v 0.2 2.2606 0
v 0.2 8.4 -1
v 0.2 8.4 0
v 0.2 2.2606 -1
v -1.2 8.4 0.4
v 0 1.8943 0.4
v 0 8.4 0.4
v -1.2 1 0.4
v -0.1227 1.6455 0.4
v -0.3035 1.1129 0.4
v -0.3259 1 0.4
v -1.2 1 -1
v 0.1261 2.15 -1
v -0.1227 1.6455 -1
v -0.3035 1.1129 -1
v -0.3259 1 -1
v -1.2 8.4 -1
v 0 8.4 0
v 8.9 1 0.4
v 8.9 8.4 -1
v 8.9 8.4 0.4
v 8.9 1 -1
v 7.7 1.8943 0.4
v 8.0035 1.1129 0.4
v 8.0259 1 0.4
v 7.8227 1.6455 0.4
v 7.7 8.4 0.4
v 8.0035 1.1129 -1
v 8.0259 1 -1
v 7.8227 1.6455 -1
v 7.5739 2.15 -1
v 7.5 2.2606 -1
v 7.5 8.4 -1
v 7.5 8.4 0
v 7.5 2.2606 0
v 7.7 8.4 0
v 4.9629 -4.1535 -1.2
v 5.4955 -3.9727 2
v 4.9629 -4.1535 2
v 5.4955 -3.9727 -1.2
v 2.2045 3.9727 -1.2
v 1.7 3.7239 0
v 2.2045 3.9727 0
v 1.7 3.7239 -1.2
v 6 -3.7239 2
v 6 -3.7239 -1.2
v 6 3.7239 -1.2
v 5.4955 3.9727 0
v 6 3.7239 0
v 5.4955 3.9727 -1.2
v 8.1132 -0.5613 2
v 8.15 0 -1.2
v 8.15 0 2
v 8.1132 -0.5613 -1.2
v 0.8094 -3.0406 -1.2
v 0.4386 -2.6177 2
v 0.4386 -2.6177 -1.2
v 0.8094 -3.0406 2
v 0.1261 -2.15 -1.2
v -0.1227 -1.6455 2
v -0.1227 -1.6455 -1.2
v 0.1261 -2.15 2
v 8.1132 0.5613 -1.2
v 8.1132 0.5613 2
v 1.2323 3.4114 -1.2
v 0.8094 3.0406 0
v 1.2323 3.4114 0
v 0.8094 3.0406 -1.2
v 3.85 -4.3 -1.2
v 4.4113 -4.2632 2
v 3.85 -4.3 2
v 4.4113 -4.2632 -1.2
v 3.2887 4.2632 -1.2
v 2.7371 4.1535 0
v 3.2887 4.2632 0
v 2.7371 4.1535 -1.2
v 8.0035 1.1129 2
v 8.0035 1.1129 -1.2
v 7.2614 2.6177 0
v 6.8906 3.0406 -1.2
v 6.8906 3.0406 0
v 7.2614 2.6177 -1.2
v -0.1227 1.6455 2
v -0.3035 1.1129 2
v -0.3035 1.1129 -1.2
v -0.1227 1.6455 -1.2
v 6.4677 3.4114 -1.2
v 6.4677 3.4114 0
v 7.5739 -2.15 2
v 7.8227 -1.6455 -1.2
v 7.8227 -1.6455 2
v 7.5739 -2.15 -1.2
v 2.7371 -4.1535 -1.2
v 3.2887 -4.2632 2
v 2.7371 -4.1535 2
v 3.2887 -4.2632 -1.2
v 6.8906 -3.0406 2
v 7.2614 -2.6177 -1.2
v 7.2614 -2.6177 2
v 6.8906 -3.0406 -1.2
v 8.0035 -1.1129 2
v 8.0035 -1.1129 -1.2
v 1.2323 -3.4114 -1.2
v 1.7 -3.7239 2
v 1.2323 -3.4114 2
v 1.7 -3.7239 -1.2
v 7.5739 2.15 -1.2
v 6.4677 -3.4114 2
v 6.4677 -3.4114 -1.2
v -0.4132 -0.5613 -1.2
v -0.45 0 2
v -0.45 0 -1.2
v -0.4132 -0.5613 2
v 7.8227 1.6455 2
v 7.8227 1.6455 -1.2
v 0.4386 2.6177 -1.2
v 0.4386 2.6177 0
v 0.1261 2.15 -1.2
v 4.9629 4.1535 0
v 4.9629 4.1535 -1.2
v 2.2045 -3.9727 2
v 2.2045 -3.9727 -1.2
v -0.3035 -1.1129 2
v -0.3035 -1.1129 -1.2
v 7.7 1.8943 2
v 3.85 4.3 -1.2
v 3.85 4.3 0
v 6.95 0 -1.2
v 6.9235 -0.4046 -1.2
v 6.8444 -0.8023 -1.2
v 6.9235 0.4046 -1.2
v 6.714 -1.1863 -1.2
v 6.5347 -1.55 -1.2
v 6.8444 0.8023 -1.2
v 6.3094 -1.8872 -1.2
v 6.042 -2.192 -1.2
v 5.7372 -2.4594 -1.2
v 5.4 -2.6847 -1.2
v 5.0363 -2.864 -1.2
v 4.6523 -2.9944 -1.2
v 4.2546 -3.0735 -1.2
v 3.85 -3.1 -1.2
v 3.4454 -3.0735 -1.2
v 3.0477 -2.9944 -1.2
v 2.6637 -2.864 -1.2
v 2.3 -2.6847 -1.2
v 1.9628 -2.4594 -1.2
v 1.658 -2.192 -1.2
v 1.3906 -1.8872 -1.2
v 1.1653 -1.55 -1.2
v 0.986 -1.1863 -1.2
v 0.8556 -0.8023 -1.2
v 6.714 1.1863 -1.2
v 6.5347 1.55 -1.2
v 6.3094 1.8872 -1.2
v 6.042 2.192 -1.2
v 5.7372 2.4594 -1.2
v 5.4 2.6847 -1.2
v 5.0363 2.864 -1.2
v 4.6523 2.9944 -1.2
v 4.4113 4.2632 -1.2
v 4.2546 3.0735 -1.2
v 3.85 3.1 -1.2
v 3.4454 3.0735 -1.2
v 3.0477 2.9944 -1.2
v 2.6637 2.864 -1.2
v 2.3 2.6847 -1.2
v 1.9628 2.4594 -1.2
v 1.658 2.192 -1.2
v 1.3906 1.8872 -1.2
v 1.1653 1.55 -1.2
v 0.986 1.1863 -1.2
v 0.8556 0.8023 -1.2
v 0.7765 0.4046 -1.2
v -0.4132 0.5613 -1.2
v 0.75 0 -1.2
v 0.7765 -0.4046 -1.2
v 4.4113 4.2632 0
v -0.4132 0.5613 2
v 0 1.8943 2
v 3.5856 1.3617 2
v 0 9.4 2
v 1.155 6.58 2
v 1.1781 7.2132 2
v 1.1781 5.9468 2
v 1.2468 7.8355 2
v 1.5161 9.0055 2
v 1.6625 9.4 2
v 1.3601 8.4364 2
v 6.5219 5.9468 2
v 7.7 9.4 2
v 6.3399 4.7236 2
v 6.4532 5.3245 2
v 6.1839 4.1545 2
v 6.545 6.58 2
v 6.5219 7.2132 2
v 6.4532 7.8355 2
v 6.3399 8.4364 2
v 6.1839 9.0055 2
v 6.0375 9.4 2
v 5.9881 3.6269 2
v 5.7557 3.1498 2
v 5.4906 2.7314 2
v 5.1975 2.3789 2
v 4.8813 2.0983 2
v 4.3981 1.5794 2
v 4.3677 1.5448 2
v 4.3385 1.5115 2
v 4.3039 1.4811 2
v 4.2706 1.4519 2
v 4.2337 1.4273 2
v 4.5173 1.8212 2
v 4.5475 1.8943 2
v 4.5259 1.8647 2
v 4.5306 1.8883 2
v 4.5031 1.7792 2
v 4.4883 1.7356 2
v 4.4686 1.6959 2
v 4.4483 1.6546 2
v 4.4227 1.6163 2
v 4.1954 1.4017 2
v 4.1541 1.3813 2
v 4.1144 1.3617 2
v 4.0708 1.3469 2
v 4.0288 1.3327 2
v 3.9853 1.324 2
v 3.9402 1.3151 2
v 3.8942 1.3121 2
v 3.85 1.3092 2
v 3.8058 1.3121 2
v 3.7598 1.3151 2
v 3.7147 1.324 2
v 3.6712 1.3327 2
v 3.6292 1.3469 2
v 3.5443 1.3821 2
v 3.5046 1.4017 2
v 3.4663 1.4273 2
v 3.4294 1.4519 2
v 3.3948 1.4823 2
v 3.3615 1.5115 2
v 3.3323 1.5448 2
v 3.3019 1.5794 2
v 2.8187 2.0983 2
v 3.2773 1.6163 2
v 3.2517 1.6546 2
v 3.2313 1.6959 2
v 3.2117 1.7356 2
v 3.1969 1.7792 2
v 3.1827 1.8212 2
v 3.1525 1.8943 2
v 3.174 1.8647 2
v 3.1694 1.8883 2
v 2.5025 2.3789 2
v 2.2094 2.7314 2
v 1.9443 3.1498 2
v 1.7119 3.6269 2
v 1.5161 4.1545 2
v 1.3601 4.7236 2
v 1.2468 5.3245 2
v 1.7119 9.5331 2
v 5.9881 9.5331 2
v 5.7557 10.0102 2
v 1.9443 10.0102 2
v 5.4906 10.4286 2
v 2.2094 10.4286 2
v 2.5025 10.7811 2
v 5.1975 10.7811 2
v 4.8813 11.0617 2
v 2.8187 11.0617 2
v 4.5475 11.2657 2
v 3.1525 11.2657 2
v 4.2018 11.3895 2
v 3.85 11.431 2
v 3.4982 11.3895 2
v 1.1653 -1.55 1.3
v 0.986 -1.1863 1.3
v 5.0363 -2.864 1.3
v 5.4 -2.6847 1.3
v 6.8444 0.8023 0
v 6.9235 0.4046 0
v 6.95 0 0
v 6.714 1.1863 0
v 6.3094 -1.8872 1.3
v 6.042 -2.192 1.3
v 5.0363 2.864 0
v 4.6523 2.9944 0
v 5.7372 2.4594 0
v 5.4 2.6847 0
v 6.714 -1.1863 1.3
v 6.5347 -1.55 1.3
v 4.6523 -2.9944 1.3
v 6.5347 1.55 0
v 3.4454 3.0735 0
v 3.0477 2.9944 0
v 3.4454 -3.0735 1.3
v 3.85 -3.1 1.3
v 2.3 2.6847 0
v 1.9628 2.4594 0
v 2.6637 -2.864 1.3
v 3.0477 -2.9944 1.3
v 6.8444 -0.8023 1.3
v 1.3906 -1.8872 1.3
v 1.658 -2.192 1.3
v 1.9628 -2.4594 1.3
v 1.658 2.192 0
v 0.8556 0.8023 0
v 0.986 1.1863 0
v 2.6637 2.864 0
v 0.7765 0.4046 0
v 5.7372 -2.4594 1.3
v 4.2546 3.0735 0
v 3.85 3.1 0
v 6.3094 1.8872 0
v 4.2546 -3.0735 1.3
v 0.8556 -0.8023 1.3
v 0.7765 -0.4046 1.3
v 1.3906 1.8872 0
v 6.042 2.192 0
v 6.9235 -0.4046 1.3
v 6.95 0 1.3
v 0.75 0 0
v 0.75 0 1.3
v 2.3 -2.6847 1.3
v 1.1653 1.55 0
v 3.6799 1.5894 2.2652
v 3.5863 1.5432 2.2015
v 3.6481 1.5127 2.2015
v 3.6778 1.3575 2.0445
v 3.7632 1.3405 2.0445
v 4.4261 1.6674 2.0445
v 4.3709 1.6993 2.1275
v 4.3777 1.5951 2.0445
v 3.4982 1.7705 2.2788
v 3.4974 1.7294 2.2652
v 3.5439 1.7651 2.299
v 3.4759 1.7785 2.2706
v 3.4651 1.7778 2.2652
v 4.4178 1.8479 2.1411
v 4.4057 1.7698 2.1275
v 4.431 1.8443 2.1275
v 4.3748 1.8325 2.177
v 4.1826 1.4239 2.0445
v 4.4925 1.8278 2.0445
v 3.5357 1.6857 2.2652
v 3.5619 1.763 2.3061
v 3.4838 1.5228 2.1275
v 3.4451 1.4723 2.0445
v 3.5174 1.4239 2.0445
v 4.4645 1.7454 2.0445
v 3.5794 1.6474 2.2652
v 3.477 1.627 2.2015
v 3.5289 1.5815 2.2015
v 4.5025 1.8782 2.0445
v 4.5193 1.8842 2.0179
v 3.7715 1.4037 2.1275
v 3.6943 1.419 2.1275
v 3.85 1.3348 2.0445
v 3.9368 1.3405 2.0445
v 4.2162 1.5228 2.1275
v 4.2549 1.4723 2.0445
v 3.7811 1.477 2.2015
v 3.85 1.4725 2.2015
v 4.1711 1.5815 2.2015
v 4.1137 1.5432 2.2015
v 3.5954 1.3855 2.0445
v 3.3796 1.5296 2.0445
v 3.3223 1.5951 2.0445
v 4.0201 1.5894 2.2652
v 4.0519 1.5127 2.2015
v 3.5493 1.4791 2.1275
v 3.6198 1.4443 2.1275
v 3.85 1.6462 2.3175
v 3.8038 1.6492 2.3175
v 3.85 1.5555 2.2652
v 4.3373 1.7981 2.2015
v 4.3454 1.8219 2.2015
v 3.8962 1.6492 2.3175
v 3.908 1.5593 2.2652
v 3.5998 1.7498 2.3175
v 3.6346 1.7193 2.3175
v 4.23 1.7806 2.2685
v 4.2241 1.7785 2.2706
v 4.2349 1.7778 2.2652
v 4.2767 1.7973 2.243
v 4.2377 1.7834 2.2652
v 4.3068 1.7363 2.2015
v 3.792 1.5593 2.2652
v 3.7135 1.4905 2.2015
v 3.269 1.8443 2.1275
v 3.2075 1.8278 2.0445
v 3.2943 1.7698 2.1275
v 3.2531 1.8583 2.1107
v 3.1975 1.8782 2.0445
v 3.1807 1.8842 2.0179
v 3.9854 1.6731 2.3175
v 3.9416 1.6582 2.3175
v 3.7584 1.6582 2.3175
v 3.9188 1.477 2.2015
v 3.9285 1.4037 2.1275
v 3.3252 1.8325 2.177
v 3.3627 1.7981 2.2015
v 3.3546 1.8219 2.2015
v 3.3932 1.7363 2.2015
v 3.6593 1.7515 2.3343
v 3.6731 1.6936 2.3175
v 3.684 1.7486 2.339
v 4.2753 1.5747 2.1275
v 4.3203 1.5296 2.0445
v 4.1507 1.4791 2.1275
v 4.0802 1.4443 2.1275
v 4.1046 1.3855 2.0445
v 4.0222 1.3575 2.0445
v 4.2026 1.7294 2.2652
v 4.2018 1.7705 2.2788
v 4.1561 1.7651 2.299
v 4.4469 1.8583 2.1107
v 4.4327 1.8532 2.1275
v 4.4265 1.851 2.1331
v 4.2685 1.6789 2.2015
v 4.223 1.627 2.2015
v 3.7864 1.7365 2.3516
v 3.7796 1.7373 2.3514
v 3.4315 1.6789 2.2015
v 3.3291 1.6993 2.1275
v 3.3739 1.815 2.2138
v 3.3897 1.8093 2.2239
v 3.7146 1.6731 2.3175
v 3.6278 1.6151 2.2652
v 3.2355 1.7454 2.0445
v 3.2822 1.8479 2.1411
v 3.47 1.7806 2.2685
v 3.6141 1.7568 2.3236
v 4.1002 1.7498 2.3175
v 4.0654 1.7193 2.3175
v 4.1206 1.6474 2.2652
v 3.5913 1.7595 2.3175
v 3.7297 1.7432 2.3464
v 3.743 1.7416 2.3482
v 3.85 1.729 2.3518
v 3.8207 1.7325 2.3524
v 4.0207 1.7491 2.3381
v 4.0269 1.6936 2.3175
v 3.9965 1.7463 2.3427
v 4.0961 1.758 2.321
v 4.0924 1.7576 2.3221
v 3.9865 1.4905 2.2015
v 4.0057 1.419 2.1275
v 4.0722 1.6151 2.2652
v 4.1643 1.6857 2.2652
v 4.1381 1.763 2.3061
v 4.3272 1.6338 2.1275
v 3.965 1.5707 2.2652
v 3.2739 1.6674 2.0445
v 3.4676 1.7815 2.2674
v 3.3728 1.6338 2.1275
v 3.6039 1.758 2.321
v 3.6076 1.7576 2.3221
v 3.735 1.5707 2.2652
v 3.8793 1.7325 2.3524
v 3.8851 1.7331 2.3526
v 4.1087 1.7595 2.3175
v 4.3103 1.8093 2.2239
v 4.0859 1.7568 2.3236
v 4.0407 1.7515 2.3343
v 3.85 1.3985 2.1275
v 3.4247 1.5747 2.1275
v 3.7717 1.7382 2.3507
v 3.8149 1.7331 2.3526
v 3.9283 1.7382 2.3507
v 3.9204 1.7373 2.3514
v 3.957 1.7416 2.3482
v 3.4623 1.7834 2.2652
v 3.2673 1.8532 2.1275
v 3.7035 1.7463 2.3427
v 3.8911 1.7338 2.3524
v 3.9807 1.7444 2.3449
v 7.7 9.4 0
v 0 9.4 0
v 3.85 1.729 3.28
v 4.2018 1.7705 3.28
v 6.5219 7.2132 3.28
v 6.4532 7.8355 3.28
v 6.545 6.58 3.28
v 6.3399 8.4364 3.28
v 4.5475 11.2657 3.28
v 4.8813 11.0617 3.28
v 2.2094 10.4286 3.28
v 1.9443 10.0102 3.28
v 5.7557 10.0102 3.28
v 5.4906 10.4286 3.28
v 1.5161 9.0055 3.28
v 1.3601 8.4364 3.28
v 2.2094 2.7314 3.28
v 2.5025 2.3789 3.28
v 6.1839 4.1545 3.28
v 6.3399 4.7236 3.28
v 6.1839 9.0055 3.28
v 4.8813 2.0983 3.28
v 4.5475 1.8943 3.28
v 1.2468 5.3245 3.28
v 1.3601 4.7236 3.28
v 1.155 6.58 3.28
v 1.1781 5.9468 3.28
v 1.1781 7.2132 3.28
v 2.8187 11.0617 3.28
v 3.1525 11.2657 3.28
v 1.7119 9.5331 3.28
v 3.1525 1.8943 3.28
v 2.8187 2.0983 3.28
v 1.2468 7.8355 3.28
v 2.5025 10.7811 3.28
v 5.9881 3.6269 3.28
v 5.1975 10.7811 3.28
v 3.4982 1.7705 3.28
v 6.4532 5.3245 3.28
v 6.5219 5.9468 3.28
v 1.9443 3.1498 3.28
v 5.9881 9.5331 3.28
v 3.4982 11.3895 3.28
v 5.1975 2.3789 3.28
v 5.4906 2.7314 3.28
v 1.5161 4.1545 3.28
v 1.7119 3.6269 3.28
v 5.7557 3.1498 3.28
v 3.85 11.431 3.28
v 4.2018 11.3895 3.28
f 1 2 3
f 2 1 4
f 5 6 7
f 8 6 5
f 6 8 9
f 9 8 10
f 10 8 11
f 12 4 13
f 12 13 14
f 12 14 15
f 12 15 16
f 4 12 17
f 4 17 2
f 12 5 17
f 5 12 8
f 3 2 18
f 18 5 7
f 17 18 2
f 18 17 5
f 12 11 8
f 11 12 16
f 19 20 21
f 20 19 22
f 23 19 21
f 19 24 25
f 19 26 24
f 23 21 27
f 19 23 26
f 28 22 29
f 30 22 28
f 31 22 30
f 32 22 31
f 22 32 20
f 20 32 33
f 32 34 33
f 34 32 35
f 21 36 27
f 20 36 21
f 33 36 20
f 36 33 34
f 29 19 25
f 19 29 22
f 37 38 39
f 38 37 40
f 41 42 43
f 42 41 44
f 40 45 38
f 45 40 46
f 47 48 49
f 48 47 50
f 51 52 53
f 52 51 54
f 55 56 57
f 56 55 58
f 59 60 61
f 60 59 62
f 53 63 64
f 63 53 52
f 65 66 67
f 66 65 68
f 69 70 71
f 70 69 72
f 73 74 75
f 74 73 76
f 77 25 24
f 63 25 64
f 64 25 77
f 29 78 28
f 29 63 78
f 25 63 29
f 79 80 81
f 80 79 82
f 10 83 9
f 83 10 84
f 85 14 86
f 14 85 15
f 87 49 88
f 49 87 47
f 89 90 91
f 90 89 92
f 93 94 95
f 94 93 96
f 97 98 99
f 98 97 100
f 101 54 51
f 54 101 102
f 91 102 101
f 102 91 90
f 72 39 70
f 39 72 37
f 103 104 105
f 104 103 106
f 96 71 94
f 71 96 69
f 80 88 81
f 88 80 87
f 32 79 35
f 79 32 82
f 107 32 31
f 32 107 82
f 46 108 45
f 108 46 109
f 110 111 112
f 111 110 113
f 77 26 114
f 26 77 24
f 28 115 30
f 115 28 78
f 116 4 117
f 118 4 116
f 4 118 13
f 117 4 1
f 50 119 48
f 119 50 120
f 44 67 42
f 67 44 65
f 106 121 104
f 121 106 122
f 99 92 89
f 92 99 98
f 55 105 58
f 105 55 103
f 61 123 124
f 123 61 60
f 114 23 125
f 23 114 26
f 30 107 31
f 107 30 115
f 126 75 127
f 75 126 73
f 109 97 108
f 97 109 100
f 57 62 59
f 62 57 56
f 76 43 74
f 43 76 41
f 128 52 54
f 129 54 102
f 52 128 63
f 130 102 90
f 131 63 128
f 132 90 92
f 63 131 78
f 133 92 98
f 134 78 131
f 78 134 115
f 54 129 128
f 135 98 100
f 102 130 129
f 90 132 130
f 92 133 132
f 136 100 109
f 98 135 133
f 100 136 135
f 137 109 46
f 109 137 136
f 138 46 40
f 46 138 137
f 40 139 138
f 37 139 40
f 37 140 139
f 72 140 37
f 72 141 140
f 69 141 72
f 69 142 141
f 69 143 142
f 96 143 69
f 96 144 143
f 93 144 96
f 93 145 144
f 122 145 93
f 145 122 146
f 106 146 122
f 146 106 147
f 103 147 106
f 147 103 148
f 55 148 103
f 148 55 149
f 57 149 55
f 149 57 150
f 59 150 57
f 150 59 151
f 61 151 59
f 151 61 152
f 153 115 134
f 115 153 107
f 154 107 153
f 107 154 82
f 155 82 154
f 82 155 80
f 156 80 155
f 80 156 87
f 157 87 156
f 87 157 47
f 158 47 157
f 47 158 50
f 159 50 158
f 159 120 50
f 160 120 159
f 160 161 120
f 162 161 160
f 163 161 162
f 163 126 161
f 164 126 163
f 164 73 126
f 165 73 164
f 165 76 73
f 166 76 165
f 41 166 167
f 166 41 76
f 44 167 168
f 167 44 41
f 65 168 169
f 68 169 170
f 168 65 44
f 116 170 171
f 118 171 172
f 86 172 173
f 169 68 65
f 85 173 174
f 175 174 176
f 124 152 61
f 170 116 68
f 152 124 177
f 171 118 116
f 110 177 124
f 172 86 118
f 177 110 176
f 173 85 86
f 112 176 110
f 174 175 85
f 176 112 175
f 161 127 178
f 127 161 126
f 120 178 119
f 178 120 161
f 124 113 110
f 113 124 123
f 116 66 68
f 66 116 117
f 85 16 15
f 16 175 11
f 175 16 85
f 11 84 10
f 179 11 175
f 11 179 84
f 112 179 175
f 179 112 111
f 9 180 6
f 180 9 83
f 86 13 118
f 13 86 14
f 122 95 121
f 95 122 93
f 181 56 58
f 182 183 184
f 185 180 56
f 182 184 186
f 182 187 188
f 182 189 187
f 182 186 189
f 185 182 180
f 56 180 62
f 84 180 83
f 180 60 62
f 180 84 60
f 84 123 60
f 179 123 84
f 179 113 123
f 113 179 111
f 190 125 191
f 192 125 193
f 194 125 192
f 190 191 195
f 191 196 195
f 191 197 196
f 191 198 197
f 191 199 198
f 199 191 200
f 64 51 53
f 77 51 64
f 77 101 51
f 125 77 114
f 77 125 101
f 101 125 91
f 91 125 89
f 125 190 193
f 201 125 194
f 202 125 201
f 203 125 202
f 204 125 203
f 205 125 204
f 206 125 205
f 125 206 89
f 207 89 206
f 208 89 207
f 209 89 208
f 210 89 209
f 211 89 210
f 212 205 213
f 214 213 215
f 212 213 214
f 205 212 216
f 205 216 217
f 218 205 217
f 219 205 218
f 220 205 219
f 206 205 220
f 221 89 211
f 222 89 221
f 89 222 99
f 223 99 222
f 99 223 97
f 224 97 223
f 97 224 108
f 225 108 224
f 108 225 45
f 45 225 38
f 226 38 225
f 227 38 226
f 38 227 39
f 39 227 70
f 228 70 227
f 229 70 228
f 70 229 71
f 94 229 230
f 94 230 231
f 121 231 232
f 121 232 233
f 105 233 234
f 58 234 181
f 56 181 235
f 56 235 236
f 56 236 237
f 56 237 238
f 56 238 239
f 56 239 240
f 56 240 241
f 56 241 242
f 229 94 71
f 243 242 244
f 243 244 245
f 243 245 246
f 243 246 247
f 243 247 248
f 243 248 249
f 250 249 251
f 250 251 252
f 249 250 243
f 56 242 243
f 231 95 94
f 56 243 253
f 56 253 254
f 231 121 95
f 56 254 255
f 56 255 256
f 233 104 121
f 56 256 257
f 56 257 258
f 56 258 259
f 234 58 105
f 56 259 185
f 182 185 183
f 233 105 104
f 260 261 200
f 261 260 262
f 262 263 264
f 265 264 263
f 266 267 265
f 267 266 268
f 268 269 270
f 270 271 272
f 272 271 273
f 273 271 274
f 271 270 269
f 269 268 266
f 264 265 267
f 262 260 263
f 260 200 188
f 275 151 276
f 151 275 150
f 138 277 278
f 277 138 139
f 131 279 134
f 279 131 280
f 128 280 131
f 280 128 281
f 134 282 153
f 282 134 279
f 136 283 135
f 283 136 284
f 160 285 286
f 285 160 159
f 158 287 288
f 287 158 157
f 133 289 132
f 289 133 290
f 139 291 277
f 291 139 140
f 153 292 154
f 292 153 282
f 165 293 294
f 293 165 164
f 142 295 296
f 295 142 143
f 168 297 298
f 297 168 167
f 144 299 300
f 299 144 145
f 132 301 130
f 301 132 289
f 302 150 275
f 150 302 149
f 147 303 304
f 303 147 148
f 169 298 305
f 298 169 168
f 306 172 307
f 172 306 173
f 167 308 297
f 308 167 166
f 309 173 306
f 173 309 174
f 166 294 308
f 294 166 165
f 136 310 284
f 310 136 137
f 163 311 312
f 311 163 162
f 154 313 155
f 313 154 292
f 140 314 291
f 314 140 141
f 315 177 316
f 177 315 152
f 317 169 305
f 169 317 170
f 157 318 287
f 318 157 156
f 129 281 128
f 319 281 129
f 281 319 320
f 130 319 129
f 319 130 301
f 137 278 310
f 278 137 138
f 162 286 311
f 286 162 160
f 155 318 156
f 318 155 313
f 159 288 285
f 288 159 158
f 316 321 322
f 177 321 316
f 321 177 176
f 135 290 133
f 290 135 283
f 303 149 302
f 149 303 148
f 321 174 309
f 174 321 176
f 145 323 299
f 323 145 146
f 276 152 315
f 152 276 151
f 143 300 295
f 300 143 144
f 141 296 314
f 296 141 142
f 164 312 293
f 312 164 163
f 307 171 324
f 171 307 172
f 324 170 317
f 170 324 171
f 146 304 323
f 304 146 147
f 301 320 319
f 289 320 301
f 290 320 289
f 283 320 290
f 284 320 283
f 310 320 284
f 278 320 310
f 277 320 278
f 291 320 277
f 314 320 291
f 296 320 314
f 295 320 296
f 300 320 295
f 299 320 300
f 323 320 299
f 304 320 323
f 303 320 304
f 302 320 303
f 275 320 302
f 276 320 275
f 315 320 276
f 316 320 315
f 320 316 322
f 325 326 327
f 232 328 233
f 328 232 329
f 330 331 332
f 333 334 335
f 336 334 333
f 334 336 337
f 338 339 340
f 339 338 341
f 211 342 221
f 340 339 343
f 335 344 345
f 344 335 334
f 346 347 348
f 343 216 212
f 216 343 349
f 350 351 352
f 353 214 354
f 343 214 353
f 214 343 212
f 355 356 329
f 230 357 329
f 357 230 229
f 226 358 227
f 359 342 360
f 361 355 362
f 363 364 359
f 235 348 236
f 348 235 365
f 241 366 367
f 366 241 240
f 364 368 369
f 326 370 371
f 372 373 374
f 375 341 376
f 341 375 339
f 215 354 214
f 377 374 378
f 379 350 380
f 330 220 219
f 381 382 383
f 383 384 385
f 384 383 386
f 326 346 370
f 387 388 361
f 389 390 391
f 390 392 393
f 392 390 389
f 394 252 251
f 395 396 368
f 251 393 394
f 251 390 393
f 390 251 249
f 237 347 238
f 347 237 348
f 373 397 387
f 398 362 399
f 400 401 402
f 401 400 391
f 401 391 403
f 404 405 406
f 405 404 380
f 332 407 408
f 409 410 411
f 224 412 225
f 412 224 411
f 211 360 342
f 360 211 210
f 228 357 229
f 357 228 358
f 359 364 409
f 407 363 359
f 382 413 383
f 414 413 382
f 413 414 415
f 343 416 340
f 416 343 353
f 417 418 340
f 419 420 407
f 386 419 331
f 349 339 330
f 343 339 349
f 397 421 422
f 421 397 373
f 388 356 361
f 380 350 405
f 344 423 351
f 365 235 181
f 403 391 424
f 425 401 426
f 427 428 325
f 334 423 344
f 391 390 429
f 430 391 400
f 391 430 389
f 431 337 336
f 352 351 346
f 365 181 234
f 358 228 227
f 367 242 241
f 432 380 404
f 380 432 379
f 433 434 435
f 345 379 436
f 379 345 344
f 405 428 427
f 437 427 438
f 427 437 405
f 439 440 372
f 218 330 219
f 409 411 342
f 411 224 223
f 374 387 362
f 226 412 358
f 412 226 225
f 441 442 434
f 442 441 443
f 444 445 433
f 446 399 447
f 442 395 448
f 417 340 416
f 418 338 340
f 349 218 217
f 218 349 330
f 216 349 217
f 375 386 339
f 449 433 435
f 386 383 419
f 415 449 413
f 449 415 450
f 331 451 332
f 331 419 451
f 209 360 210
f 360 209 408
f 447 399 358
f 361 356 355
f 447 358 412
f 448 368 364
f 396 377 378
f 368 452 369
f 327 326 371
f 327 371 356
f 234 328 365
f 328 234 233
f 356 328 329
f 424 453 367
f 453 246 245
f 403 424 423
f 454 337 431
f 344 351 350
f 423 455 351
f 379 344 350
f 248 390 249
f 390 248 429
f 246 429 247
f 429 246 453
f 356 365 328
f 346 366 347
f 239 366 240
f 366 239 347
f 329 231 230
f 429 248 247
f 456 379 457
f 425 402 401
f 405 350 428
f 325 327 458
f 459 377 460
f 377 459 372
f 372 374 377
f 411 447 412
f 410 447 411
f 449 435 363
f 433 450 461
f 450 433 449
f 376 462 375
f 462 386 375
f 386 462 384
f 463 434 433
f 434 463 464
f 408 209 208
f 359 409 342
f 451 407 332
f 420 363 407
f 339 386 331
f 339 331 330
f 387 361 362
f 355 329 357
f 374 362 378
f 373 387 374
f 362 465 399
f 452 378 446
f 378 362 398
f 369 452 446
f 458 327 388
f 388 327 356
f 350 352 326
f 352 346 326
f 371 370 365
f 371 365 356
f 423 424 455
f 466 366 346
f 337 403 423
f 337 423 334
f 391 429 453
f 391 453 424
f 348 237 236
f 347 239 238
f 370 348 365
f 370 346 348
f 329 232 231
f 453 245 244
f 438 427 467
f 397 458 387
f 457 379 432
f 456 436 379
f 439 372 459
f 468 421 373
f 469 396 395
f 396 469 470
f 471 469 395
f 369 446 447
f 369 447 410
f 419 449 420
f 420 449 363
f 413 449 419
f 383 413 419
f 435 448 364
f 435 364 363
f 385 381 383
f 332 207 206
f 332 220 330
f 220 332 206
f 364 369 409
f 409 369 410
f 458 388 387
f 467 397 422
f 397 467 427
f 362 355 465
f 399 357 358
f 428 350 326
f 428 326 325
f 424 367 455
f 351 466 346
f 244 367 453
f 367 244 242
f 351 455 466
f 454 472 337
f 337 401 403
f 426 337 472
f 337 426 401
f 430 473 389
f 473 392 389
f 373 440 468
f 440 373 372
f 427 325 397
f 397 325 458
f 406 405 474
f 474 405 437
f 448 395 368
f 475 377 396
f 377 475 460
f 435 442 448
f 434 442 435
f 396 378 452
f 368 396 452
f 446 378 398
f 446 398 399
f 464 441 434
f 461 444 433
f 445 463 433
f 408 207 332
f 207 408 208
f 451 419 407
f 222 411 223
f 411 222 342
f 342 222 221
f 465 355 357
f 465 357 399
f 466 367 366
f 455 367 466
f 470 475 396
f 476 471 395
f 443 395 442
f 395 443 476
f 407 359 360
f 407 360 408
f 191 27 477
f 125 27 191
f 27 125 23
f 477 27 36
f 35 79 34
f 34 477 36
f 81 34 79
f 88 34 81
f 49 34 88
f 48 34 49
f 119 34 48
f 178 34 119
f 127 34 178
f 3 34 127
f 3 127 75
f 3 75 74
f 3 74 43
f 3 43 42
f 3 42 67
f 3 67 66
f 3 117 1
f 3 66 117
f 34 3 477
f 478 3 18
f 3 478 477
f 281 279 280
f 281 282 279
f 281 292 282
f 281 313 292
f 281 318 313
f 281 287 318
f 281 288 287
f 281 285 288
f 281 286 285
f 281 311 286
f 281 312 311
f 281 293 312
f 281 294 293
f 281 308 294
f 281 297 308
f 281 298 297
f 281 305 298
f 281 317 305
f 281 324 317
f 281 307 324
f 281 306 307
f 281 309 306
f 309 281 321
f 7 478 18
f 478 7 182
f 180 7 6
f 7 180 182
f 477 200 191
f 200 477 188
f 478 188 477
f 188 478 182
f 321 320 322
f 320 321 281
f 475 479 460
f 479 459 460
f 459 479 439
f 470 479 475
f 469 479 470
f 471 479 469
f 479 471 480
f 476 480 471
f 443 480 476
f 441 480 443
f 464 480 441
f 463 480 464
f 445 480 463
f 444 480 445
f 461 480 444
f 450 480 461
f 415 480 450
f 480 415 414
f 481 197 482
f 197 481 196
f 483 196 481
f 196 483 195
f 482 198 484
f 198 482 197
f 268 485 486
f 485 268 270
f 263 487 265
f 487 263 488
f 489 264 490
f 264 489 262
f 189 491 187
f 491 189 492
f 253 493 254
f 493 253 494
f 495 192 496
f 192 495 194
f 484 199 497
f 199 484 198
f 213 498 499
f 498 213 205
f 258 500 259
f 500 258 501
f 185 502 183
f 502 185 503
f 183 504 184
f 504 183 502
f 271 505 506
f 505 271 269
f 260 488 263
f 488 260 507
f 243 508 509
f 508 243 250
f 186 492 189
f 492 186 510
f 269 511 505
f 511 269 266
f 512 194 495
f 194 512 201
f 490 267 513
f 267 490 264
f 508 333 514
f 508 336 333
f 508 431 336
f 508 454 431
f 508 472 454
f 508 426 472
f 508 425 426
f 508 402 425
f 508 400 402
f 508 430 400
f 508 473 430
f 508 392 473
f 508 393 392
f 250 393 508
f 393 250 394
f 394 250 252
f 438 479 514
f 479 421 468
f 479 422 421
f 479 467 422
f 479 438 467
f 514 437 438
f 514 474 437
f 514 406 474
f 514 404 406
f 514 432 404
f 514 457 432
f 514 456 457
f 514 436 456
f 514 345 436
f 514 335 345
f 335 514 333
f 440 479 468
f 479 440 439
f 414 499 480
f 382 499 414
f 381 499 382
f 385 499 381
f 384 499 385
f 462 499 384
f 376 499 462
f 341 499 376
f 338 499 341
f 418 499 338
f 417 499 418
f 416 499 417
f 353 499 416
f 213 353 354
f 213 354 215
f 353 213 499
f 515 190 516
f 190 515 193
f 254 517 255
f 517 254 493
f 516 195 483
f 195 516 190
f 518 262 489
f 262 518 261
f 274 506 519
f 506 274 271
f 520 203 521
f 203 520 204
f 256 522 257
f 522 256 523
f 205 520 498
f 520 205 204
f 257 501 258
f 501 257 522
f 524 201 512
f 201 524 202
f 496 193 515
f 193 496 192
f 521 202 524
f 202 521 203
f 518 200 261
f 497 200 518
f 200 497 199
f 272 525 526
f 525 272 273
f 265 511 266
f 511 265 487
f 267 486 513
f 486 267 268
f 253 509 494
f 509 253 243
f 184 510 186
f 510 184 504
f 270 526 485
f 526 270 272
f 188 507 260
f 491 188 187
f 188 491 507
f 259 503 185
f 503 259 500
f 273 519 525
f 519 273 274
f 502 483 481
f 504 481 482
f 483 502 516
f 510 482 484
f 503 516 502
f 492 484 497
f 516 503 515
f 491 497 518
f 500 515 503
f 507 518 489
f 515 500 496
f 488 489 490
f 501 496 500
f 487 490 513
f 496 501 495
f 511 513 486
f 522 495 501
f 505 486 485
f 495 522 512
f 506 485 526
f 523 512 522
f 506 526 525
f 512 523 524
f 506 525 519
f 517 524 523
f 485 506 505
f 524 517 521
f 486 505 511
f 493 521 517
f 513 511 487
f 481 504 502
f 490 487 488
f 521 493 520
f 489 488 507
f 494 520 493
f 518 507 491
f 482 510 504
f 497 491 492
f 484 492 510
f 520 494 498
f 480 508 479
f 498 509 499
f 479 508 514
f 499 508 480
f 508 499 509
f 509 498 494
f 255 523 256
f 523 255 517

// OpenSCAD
// file: lib/common.scad
// Shared modules for the HID Gamepad case.

// Rounded-corner box, flat in Z.
module rounded_box(w, h, t, r) {
    hull() {
        for (x = [r, w - r], y = [r, h - r]) {
            translate([x, y, 0]) cylinder(h = t, r = r);
        }
    }
}

// 2D rounded rectangle.
module rounded_rect(w, h, r) {
    hull() {
        for (x = [r, w - r], y = [r, h - r]) {
            translate([x, y]) circle(r);
        }
    }
}

// Annular flexure slot: full ring minus n bridge tabs (the beams).
// Cut this THROUGH a plate to create a printed-in-place button.
module flexure_slot(cap_d, slot_w, beam_n, beam_w, t) {
    difference() {
        // The ring
        translate([0, 0, -0.1]) difference() {
            cylinder(h = t + 0.2, d = cap_d + 2 * slot_w);
            translate([0, 0, -0.1]) cylinder(h = t + 0.4, d = cap_d);
        }
        // Beam bridges left in place
        for (i = [0 : beam_n - 1]) {
            rotate([0, 0, i * 360 / beam_n])
                translate([-beam_w / 2, 0, -0.2])
                    cube([beam_w, cap_d / 2 + slot_w + 1, t + 0.6]);
        }
    }
}

// Boss with a blind press-fit bore, hanging below z=0.
module tip_boss(boss_d, bore_d, boss_h, bore_h) {
    difference() {
        translate([0, 0, -boss_h]) cylinder(h = boss_h, d = boss_d);
        translate([0, 0, -boss_h - 0.1]) cylinder(h = bore_h + 0.1, d = bore_d);
    }
}
// file: config.scad
// =============================================================================
// HID Gamepad case — user configuration
//
// THIS IS THE ONLY FILE YOU EDIT. All dimensions in millimetres.
//
// Coordinate system for control placement: X/Y measured from the SCREEN's
// top-left corner (phone held in landscape, USB port to the right), matching
// the app's "Case config" export — calibrate in the app, share the exported
// fragment, and paste the arrays below for a perfectly matched v2 print.
// =============================================================================

// ---- Phone body (defaults: Pixel 8-ish; measure your phone!) ---------------
phone_w = 150.5;   // phone height in portrait = width in landscape
phone_h = 70.8;    // phone width in portrait  = height in landscape
phone_t = 8.9;     // thickness, excluding camera bump
corner_r = 8;      // body corner radius

// Screen inset from the phone body edge: [left, top, right, bottom]
// (landscape orientation, same frame as control coordinates).
screen_inset = [3.0, 2.5, 3.0, 2.5];

// Camera bump keep-out on the BACK (landscape coords from body top-left).
camera_cutout = [5, 8, 28, 55];   // [x, y, width, height]

// USB port opening centred on the right edge (landscape).
usb_w = 14;

// ---- Frame construction -----------------------------------------------------
wall_t = 2.0;          // side wall thickness
face_t = 2.0;          // front faceplate thickness
back_t = 1.6;          // back tray thickness
grip_w = 22;           // grip wing width beyond the phone, each side
edge_air_gap = 2.0;    // faceplate stays this far clear of the screen edge
                       //   (>= 2 mm: prevents ghost edge touches)
tip_hover = 1.5;       // conductive tip rest height above the glass
clearance = 0.15;      // press-fit clearance
lip = 1.2;             // snap-over lip depth holding the phone

// ---- Flexure buttons (printed in place in the faceplate) --------------------
// [x_mm, y_mm, label] from screen top-left. Cap diameter/travel are global.
flex_buttons = [
    [124, 48, "A"],
    [133, 37, "B"],
    [115, 37, "X"],
    [124, 26, "Y"],
    [ 63, 11, "Select"],
    [ 81, 11, "Start"],
];
btn_cap_d = 11;        // button cap (island) diameter
btn_slot_w = 1.6;      // flexure slot width around the cap
btn_beam_n = 3;        // number of flexure beams
btn_beam_w = 2.4;      // beam width
flexure_t = 0.8;       // beam thickness (thinner = softer press)
tip_bore_d = 6.2;      // press-fit bore for 6 mm capacitive stylus tips

// ---- Toggle sliders ---------------------------------------------------------
// [x_mm, y_mm, label]; slider travels vertically (screen Y), ON = pressed down.
toggles = [
    [ 52, 6, "T1"],
    [ 92, 6, "T2"],
];
tgl_channel_w = 8;     // channel width
tgl_channel_l = 16;    // channel length (travel + slider body)
tgl_travel = 6;        // slider travel between OFF and ON detents

// ---- Off-the-shelf part mounts ---------------------------------------------
// Clip-on capacitive trigger pockets: gaps in the frame's TOP rim where a
// commercial "mobile game trigger" clamps the phone edge directly.
// [x_mm (screen coords), clamp_width_mm]
trigger_mounts = [
    [ 8, 22],
    [136, 22],
];

// Suction-cup joystick locating wells: open circles in the faceplate with a
// raised ring that keys the joystick base. [x_mm, y_mm, base_diameter_mm]
stick_wells = [
    [25, 39, 30],
];
stick_ring_h = 2.0;    // locating ring height above the faceplate
stick_ring_t = 1.6;    // locating ring wall thickness

// ---- Central viewing window -------------------------------------------------
// Open area in the middle of the faceplate (status text stays visible and
// fingers can reach the app's menu). [x, y, w, h] in screen coords.
window = [40, 18, 70, 40];

// ---- Print/quality ----------------------------------------------------------
$fn = 48;
// main file
// =============================================================================
// toggle_slider.scad — latching toggle slider (print one per toggle).
//
// Rides in the faceplate channel. Sliding to ON cams the conductive tip
// down onto the glass and detents hold it there; OFF lifts it clear.
// The app's default toggle mode ("follow contact") mirrors this latch; the
// "flip per tap" mode suits sliders that only tap the glass momentarily.
//
// Assembly: push a 6 mm capacitive stylus tip into the bore, drop the slider
// into the channel from above, then clip the keeper tab.
// =============================================================================

include <config.scad>
use <lib/common.scad>

slider_l = tgl_channel_l - tgl_travel - 0.6;
slider_w = tgl_channel_w - 2 * clearance;
body_t = face_t;                       // sits flush with the faceplate
ramp = 1.2;                            // cam drop toward ON

module toggle_slider() {
    union() {
        // Body with thumb ridge
        cube([slider_w, slider_l, body_t]);
        translate([slider_w / 2, slider_l * 0.7, body_t])
            scale([1, 1.8, 0.8]) cylinder(h = 1.6, d = slider_w * 0.7);

        // Retaining wings (slide under the faceplate); overlap the body so
        // the part is a single manifold volume.
        for (x = [-1.2, slider_w - 0.2]) {
            translate([x, 1, -1.0]) cube([1.4, slider_l - 2, 1.4]);
        }

        // Tip carrier arm at the leading edge: flexes down the cam ramp
        translate([slider_w / 2, 0, 0]) {
            difference() {
                translate([0, 0, -ramp]) cylinder(h = body_t + ramp, d = tip_bore_d + 2.4);
                translate([0, 0, -ramp - 0.1]) cylinder(h = body_t + ramp - 0.6, d = tip_bore_d);
            }
        }

        // Detent bumps (engage matching channel edges at OFF and ON);
        // embedded slightly so they fuse with the body.
        for (y = [2, slider_l - 2]) {
            translate([slider_w / 2, y, body_t - 0.4]) sphere(d = 1.6);
        }
    }
}

toggle_slider();
